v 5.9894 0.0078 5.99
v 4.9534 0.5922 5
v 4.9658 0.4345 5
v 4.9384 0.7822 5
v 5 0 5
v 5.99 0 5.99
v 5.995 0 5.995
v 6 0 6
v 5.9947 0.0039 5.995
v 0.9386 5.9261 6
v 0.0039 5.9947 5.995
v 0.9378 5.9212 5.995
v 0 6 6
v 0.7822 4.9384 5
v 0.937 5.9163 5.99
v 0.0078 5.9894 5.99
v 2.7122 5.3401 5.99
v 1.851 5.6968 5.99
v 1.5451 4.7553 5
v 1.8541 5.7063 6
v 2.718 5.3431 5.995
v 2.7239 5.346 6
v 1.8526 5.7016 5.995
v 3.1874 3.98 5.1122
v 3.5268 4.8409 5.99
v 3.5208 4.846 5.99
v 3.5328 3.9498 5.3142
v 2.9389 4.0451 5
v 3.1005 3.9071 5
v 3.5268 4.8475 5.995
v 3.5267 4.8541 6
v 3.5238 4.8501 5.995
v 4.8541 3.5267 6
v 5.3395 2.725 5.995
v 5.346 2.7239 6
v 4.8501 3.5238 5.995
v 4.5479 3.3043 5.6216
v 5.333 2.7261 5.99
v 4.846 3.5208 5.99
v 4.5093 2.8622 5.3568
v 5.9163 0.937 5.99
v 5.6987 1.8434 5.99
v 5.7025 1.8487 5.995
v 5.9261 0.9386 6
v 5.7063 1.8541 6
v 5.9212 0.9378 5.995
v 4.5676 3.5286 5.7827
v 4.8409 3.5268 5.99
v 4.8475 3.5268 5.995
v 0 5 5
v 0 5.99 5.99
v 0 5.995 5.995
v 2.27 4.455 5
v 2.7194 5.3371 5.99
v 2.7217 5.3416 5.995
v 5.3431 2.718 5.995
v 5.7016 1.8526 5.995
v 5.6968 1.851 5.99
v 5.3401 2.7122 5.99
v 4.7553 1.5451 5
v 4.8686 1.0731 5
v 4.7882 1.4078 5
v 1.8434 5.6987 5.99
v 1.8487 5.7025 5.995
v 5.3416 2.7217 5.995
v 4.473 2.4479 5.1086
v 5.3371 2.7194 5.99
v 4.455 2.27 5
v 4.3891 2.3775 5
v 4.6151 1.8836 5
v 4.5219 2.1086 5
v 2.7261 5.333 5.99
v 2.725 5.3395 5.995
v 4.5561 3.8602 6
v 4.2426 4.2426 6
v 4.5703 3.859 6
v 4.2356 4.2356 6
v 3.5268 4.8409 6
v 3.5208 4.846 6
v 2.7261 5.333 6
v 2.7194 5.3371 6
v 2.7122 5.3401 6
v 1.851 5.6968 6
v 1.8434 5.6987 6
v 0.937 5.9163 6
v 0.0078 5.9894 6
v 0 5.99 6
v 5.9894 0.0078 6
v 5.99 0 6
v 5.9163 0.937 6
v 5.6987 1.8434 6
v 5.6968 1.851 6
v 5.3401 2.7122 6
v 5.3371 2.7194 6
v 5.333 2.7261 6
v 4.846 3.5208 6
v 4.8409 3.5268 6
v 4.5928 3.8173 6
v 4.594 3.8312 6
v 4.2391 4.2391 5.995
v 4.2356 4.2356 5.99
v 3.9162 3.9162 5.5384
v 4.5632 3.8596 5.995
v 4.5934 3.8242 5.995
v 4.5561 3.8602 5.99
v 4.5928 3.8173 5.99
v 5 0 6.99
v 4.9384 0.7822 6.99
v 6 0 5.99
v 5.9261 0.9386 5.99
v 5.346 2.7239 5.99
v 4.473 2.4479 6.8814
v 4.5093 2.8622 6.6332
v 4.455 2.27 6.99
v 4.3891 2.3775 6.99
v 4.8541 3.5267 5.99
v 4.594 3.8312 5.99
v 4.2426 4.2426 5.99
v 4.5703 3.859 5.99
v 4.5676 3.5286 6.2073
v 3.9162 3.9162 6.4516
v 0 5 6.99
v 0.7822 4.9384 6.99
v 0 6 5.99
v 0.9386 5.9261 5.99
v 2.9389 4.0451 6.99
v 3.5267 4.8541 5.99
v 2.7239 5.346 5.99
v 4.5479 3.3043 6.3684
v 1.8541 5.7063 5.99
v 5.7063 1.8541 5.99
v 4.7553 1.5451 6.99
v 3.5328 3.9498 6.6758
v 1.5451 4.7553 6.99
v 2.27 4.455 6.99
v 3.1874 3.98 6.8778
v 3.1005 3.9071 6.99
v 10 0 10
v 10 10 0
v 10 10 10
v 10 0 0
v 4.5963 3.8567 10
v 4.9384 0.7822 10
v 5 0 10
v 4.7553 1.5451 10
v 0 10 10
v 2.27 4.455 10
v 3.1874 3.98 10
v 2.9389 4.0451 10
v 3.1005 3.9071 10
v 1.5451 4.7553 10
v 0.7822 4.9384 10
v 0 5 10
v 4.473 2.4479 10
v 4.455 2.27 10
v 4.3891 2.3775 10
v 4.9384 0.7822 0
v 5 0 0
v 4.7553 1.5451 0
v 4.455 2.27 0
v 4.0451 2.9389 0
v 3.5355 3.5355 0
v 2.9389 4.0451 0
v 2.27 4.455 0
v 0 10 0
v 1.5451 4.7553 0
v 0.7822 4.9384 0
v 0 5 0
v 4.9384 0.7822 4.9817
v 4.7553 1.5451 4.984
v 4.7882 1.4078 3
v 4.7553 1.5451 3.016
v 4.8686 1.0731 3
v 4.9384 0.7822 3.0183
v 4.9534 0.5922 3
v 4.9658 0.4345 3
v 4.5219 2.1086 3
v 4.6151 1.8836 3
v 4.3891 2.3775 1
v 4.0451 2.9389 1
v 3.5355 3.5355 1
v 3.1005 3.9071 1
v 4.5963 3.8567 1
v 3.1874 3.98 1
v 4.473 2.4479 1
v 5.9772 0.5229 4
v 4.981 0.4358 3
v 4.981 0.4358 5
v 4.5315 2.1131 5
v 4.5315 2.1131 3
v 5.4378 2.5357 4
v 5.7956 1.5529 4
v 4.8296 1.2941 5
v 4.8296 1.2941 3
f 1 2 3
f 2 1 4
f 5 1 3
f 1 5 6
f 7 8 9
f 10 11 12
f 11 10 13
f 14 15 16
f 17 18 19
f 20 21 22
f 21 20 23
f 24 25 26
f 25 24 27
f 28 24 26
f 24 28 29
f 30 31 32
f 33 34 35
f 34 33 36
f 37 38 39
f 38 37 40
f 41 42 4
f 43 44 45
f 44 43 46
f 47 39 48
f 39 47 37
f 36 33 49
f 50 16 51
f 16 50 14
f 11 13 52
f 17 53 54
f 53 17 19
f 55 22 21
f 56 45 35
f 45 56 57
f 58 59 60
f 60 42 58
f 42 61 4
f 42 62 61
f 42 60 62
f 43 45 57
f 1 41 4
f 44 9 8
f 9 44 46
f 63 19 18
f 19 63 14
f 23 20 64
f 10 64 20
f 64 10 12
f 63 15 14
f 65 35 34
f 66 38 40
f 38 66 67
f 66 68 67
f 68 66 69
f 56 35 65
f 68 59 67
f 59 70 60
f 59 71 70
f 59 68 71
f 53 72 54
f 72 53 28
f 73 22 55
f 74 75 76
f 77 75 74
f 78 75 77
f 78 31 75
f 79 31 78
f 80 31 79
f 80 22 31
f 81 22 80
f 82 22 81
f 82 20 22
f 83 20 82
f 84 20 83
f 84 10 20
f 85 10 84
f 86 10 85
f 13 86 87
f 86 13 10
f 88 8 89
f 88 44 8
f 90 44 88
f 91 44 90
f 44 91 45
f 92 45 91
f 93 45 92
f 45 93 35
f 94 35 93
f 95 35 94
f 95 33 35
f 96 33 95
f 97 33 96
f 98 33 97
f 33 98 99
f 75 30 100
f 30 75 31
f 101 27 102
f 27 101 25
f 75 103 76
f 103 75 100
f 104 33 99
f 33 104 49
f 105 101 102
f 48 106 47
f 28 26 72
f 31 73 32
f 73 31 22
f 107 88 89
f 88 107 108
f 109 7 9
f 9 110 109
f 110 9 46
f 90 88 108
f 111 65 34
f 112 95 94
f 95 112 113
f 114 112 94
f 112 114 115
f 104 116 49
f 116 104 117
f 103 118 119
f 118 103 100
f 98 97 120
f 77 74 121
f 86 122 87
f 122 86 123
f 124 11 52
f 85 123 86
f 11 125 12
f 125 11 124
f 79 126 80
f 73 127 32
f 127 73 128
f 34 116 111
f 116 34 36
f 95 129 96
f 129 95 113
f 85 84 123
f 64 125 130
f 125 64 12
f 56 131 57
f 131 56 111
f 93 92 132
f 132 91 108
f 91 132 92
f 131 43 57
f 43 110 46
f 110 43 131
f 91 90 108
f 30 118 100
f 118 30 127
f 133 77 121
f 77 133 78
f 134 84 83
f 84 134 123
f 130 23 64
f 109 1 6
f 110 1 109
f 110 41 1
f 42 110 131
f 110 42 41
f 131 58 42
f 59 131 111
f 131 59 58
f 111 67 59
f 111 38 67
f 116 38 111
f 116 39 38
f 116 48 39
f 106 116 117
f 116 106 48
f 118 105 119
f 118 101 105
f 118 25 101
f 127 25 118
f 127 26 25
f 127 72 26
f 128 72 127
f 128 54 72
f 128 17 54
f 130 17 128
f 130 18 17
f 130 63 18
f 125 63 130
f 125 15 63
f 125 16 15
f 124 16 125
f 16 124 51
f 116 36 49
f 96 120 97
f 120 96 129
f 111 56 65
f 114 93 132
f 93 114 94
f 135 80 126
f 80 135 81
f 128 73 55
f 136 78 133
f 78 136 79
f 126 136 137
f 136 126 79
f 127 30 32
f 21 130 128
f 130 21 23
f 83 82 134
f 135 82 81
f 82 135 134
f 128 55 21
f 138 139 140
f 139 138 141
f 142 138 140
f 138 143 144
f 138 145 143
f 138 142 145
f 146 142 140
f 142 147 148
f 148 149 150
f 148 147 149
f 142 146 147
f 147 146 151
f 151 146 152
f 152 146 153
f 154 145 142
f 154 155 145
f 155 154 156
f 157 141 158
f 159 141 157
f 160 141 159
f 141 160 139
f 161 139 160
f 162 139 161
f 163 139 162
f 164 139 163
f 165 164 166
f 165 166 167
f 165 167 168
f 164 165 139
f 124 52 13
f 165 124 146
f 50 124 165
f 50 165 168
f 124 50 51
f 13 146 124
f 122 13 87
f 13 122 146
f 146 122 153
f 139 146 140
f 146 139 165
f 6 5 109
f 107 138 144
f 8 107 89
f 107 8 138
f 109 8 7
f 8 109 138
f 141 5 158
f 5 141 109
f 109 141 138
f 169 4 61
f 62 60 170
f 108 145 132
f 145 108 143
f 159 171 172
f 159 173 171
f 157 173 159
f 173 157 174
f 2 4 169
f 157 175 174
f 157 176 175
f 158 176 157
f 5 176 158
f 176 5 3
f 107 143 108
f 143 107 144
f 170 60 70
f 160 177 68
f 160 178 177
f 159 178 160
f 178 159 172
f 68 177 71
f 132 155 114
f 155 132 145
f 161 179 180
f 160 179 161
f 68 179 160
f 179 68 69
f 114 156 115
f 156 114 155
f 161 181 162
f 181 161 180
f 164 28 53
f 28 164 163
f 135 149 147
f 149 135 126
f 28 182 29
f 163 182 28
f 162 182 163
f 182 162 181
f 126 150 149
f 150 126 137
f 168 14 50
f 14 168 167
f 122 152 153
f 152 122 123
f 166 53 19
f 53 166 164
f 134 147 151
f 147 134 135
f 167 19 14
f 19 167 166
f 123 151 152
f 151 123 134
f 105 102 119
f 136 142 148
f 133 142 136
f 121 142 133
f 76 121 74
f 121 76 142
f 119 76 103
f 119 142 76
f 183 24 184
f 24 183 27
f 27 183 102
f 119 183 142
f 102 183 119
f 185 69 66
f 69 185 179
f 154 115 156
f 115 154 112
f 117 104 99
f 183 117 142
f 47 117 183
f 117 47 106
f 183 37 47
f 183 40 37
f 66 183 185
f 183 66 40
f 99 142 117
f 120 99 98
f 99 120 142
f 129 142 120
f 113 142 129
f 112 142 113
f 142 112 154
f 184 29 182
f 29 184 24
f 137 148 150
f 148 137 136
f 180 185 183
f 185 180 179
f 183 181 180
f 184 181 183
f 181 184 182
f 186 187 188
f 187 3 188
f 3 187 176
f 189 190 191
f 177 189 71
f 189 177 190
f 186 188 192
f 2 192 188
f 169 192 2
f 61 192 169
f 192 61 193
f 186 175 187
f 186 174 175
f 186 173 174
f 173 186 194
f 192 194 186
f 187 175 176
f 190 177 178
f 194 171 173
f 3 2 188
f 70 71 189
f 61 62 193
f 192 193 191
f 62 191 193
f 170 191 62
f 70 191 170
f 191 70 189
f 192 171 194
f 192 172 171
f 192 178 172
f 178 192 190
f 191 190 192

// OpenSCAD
$fn=40;
module radial_groove(height, depth, radius) {
    cylinder(h=height/2, r1=radius, r2=radius+depth);
    translate([0,0,height/2 - 0.01])
    cylinder(h=height/2, r1=radius+depth, r2=radius);
}

module vertical_groove(height, width, depth, radius) {
    translate([0, radius, 0])
    linear_extrude(height)
    polygon(points=[[-width/2,0], [0, depth], [width/2, 0], [width/2, -2], [-width/2, -2]]); 
}

 module radial_groove_angle(width, depth, angle, radius) {
     rotate_extrude(angle=angle)
     polygon(points=[[radius, -width/2], [depth+radius, 0], [radius, width/2], [radius-2, width/2], [radius-2, -width/2]]); 
 }


difference() {
cube(10);

    translate([0,0,5]) 
    radial_groove(2, 1, 5);
    
    translate([0,0,-0.01])
    cylinder(h=100, r=5);
    
    translate([0,0,1])
    rotate([0,0,-50])
    vertical_groove(10, 2, 1, 5);
    
    rotate([0,0,5])
    translate([0, 0, 4])
    radial_groove_angle(2, 1, 20, 5);
}
